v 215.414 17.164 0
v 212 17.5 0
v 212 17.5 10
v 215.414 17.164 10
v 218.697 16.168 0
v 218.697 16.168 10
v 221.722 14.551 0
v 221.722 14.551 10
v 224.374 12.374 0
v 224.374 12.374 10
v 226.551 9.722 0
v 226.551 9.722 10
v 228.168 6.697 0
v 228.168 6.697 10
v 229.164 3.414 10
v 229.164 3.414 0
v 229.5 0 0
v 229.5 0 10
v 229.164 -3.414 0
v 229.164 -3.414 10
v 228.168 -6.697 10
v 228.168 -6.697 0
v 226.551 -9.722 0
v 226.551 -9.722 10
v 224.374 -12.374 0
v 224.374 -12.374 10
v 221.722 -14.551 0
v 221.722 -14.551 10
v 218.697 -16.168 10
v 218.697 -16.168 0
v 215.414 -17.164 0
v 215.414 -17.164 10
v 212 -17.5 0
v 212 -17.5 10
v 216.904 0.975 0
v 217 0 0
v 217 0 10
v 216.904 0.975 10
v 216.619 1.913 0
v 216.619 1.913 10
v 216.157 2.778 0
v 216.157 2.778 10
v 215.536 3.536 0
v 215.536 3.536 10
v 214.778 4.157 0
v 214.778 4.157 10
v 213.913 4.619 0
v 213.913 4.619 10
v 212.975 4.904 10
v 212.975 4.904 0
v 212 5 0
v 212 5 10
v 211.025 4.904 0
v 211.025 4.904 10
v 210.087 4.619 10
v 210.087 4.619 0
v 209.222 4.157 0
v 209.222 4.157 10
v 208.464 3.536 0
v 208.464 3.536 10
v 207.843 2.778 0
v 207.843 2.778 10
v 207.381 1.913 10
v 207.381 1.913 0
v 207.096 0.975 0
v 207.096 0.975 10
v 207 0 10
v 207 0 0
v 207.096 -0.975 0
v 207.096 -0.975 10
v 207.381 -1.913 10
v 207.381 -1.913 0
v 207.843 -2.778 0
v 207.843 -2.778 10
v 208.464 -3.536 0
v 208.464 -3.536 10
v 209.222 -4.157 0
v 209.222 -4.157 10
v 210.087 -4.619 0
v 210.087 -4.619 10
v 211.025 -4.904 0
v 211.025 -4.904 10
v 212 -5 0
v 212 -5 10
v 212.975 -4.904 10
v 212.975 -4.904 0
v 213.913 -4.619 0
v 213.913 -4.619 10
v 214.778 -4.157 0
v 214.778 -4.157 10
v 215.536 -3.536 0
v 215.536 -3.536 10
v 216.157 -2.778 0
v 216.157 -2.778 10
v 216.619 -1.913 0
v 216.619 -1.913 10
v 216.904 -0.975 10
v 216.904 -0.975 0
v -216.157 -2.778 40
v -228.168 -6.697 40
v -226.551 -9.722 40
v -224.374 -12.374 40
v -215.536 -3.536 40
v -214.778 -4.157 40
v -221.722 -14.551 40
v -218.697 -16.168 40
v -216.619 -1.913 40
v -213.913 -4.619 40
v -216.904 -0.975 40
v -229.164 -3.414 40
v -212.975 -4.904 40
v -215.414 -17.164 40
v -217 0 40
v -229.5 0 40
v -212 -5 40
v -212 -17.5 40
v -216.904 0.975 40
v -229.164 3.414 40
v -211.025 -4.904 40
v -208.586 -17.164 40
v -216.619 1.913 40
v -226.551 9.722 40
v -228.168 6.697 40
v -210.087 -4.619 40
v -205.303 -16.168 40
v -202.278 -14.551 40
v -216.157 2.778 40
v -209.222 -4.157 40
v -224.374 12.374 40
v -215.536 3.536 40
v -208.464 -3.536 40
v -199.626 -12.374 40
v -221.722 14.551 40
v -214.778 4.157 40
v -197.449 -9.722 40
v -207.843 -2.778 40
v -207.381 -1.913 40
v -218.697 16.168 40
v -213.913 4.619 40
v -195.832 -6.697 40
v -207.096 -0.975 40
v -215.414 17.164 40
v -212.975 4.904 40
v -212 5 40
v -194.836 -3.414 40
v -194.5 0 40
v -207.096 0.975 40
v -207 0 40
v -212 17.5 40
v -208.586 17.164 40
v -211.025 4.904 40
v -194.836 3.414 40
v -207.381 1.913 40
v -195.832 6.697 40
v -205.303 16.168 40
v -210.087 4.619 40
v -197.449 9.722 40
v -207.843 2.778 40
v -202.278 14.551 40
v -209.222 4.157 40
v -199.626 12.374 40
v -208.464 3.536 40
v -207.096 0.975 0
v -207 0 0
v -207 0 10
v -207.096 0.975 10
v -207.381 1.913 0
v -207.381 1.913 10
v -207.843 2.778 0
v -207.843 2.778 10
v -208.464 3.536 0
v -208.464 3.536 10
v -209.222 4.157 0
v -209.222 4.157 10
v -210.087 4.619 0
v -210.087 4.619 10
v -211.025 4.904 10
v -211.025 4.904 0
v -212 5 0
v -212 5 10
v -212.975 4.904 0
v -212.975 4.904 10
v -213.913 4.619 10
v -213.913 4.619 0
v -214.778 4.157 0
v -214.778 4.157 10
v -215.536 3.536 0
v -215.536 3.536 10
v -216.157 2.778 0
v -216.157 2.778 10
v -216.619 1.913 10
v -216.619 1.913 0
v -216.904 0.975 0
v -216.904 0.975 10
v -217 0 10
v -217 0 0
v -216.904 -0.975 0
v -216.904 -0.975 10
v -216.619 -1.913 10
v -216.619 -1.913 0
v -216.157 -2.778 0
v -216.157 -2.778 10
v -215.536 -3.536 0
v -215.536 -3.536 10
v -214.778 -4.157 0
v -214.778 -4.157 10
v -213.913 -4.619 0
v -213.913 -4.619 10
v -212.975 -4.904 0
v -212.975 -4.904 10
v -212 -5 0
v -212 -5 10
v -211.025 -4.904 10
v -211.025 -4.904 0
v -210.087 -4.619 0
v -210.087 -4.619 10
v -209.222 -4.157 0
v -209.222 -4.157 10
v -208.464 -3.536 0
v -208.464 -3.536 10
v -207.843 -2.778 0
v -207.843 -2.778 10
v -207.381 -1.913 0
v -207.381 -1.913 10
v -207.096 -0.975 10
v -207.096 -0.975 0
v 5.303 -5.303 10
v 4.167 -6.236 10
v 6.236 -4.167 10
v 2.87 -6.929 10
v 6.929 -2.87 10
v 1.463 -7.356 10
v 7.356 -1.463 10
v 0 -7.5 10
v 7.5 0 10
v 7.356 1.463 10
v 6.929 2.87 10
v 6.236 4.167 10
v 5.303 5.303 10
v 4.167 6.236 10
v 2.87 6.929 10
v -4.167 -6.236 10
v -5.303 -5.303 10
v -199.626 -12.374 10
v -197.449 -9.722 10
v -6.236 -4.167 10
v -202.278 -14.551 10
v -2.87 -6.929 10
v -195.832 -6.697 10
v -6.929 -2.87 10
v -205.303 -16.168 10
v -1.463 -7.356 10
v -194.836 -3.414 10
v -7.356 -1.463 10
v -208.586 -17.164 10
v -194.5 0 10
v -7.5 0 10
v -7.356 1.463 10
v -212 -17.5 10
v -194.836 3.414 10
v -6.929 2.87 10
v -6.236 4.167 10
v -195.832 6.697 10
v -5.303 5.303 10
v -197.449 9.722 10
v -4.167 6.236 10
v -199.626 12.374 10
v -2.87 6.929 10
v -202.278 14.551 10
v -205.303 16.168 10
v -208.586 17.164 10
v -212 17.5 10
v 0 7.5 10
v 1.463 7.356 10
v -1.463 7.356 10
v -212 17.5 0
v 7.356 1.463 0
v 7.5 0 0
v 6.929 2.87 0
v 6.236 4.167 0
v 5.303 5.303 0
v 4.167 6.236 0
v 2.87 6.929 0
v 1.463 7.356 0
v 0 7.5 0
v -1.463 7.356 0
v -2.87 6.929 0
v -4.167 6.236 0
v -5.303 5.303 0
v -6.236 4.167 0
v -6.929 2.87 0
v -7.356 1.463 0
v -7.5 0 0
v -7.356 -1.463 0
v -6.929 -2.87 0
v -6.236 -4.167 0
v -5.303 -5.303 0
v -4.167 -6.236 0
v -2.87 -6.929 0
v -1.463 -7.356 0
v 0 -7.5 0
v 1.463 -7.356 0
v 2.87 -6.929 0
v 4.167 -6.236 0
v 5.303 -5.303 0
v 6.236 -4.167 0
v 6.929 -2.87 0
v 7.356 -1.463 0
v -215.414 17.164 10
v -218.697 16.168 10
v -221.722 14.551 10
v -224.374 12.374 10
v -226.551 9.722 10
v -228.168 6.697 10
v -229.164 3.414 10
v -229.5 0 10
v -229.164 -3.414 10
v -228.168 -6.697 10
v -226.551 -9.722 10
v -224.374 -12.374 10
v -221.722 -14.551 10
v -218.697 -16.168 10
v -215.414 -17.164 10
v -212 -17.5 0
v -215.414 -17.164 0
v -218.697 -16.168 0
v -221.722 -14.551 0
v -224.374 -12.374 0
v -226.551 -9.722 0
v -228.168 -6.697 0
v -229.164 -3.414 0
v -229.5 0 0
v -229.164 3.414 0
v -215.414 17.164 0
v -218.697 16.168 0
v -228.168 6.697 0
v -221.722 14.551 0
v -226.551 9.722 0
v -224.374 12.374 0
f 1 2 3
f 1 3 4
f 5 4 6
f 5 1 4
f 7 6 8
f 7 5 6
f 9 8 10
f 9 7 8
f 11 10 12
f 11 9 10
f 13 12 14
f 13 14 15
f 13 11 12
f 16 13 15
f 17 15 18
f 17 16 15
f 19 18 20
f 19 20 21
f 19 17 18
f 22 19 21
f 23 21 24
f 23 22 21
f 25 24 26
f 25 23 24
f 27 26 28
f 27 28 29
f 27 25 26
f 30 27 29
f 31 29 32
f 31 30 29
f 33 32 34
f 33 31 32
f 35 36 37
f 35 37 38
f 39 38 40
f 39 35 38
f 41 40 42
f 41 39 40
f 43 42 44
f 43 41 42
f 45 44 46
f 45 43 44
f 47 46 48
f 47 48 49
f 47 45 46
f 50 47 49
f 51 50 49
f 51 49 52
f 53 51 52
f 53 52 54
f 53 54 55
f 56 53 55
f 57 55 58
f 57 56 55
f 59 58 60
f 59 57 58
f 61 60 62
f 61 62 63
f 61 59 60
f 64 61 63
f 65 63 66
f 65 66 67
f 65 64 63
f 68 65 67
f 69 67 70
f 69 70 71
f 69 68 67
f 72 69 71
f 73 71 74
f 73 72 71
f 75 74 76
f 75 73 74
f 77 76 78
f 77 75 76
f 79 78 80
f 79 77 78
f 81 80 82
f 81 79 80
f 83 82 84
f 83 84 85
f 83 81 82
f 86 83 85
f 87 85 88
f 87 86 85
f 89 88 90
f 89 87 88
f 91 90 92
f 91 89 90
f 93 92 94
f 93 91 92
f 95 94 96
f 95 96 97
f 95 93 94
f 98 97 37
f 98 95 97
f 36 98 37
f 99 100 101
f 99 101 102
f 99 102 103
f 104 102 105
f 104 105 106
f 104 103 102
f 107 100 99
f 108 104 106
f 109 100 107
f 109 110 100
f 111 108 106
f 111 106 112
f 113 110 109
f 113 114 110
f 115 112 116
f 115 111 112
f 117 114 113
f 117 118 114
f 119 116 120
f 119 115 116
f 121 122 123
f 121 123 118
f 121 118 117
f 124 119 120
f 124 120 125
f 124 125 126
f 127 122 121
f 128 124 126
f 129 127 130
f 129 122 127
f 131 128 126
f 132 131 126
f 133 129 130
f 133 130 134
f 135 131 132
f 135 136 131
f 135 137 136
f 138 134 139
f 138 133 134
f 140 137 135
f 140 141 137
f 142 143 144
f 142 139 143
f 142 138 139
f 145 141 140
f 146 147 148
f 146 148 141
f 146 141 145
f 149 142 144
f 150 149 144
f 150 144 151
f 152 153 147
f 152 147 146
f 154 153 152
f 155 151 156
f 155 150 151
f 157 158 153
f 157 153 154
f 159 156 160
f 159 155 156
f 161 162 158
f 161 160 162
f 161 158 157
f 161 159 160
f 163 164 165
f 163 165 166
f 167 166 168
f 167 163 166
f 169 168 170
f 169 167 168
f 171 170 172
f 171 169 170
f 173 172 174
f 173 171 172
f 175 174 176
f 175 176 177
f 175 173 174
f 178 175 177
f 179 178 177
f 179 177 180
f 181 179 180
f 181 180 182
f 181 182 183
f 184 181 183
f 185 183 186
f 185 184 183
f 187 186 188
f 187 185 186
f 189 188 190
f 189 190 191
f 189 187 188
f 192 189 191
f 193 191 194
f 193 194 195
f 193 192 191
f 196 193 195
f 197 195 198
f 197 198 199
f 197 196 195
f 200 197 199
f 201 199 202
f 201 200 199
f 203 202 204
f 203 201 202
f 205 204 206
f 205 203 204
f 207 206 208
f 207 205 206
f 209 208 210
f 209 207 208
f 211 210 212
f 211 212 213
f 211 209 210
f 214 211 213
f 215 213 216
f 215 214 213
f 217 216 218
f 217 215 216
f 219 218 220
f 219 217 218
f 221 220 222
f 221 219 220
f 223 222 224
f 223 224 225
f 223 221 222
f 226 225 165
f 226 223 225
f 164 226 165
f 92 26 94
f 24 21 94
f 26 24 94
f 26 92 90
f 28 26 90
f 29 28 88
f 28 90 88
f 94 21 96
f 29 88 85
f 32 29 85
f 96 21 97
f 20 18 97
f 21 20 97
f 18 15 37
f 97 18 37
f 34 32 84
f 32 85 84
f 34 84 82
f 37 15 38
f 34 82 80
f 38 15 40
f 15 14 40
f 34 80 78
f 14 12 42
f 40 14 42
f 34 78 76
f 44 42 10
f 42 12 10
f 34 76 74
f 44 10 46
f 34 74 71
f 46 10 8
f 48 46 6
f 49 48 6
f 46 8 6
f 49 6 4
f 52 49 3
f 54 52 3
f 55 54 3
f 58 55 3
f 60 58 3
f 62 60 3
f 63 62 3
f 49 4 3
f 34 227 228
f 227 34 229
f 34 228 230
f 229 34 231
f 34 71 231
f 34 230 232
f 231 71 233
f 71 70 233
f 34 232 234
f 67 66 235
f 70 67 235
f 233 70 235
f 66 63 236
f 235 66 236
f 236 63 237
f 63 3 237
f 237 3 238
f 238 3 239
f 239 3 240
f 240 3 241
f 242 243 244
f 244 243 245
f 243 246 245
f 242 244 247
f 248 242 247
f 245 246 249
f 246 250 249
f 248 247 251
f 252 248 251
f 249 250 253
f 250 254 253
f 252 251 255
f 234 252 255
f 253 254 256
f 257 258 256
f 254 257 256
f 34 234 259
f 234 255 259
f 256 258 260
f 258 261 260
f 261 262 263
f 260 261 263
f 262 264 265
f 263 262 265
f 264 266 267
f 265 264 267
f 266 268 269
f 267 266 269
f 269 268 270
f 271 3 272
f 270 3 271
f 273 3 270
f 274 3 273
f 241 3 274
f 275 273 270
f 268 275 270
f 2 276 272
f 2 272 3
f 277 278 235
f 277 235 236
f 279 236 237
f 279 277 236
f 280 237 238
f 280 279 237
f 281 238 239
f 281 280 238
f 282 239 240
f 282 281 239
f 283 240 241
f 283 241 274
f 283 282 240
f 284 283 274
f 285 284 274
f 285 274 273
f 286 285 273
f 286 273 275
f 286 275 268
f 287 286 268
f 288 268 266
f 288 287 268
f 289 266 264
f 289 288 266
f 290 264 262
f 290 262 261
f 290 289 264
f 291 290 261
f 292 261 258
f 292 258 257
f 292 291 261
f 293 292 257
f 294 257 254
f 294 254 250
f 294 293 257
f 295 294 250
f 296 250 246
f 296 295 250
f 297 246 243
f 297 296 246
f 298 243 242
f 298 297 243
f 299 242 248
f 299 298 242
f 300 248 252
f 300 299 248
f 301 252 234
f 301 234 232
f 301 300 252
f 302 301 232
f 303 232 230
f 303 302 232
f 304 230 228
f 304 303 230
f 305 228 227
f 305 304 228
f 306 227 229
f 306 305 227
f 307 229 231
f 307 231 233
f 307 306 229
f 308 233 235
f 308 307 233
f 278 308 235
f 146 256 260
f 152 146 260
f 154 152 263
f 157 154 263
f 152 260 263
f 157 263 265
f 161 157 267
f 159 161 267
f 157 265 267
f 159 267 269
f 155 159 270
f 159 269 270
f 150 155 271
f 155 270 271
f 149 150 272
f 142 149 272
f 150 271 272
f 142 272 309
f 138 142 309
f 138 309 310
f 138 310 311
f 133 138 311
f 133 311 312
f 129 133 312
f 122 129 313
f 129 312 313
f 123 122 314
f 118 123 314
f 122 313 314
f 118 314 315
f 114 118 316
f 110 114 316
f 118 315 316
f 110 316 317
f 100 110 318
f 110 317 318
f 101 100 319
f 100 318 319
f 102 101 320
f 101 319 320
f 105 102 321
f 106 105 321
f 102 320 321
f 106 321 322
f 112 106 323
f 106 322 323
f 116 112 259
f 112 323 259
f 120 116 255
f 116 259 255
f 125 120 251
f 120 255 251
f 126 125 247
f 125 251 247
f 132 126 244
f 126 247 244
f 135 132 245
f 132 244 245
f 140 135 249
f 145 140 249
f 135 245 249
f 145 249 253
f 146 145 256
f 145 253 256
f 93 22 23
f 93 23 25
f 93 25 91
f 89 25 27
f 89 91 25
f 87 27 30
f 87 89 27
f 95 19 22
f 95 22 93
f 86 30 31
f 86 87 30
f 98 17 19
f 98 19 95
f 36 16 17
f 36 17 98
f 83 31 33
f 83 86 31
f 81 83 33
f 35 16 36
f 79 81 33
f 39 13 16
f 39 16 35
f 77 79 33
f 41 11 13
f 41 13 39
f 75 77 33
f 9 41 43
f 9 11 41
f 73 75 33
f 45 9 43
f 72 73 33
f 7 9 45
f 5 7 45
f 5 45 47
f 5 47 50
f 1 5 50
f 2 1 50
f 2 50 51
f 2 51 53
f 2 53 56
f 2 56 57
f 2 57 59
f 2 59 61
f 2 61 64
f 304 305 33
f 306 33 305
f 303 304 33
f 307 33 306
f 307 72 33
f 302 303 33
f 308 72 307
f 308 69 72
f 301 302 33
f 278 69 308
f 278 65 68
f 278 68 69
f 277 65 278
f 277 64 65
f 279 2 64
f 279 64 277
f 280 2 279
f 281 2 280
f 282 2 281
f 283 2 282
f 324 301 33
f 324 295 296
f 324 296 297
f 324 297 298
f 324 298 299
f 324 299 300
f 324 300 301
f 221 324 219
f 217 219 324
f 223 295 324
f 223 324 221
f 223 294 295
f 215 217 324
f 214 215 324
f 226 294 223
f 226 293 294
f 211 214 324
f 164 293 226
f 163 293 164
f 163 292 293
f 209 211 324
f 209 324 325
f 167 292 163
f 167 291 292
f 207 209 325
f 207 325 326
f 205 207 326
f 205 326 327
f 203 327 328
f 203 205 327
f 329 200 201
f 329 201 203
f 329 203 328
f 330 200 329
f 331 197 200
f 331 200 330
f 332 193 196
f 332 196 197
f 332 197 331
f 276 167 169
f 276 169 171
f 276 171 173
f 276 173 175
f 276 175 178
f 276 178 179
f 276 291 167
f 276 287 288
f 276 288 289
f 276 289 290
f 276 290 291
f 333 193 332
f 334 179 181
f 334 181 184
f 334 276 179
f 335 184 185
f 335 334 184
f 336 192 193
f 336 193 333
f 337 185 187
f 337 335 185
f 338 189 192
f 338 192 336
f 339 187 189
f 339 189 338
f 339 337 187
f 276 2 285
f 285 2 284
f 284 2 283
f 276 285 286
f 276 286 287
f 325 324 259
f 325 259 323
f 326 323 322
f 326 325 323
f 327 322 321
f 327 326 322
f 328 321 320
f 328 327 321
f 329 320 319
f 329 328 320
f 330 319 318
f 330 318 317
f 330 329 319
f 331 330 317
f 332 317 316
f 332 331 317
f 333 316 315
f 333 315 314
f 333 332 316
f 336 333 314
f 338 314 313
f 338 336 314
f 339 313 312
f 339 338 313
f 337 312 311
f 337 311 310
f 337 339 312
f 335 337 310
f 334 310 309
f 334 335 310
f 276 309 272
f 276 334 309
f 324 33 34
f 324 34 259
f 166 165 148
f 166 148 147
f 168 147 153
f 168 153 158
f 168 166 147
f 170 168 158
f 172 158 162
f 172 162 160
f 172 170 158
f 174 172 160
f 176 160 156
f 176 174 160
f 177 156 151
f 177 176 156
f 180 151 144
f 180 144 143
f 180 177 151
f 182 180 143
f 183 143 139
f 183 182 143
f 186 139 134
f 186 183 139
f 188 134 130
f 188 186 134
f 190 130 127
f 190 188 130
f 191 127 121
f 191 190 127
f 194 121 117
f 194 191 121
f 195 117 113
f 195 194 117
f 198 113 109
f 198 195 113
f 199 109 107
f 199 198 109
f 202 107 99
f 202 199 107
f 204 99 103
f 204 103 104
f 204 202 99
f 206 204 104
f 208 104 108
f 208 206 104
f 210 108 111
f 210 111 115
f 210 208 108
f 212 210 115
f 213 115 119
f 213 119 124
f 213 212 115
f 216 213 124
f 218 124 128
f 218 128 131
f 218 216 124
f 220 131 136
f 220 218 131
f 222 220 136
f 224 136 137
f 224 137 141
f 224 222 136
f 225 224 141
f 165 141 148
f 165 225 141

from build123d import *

# Parameters (mm, degrees)
CROQUIS1_R              = 5
CROQUIS1_R_2            = 7.5
SALIENTE_EXTRUIR1_DEPTH = 10
CROQUIS2_R              = 17.5
CROQUIS2_R_2            = 5
SALIENTE_EXTRUIR2_DEPTH = 30


with BuildPart() as part:
    # Croquis1 → Saliente-Extruir1 (new body)
    with BuildSketch(Plane.XY):
        with BuildLine():
            Line((-212, 17.5), (212, 17.5))
            ThreePointArc((212, 17.5), (229.5, 0), (212, -17.5))
            Line((212, -17.5), (-212, -17.5))
            ThreePointArc((-212, -17.5), (-229.5, 0), (-212, 17.5))
        make_face()
        with Locations((-212, 0)):
            Circle(CROQUIS1_R, mode=Mode.SUBTRACT)
        with Locations((212, 0)):
            Circle(CROQUIS1_R, mode=Mode.SUBTRACT)
        Circle(CROQUIS1_R_2, mode=Mode.SUBTRACT)
    extrude(amount=SALIENTE_EXTRUIR1_DEPTH)

    # Croquis2 → Saliente-Extruir2 (add)
    with BuildSketch(Plane.XY.offset(10)):
        with Locations((-212, 0)):
            Circle(CROQUIS2_R)
        with Locations((-212, 0)):
            Circle(CROQUIS2_R_2, mode=Mode.SUBTRACT)
    extrude(amount=SALIENTE_EXTRUIR2_DEPTH)


solid = part.part
